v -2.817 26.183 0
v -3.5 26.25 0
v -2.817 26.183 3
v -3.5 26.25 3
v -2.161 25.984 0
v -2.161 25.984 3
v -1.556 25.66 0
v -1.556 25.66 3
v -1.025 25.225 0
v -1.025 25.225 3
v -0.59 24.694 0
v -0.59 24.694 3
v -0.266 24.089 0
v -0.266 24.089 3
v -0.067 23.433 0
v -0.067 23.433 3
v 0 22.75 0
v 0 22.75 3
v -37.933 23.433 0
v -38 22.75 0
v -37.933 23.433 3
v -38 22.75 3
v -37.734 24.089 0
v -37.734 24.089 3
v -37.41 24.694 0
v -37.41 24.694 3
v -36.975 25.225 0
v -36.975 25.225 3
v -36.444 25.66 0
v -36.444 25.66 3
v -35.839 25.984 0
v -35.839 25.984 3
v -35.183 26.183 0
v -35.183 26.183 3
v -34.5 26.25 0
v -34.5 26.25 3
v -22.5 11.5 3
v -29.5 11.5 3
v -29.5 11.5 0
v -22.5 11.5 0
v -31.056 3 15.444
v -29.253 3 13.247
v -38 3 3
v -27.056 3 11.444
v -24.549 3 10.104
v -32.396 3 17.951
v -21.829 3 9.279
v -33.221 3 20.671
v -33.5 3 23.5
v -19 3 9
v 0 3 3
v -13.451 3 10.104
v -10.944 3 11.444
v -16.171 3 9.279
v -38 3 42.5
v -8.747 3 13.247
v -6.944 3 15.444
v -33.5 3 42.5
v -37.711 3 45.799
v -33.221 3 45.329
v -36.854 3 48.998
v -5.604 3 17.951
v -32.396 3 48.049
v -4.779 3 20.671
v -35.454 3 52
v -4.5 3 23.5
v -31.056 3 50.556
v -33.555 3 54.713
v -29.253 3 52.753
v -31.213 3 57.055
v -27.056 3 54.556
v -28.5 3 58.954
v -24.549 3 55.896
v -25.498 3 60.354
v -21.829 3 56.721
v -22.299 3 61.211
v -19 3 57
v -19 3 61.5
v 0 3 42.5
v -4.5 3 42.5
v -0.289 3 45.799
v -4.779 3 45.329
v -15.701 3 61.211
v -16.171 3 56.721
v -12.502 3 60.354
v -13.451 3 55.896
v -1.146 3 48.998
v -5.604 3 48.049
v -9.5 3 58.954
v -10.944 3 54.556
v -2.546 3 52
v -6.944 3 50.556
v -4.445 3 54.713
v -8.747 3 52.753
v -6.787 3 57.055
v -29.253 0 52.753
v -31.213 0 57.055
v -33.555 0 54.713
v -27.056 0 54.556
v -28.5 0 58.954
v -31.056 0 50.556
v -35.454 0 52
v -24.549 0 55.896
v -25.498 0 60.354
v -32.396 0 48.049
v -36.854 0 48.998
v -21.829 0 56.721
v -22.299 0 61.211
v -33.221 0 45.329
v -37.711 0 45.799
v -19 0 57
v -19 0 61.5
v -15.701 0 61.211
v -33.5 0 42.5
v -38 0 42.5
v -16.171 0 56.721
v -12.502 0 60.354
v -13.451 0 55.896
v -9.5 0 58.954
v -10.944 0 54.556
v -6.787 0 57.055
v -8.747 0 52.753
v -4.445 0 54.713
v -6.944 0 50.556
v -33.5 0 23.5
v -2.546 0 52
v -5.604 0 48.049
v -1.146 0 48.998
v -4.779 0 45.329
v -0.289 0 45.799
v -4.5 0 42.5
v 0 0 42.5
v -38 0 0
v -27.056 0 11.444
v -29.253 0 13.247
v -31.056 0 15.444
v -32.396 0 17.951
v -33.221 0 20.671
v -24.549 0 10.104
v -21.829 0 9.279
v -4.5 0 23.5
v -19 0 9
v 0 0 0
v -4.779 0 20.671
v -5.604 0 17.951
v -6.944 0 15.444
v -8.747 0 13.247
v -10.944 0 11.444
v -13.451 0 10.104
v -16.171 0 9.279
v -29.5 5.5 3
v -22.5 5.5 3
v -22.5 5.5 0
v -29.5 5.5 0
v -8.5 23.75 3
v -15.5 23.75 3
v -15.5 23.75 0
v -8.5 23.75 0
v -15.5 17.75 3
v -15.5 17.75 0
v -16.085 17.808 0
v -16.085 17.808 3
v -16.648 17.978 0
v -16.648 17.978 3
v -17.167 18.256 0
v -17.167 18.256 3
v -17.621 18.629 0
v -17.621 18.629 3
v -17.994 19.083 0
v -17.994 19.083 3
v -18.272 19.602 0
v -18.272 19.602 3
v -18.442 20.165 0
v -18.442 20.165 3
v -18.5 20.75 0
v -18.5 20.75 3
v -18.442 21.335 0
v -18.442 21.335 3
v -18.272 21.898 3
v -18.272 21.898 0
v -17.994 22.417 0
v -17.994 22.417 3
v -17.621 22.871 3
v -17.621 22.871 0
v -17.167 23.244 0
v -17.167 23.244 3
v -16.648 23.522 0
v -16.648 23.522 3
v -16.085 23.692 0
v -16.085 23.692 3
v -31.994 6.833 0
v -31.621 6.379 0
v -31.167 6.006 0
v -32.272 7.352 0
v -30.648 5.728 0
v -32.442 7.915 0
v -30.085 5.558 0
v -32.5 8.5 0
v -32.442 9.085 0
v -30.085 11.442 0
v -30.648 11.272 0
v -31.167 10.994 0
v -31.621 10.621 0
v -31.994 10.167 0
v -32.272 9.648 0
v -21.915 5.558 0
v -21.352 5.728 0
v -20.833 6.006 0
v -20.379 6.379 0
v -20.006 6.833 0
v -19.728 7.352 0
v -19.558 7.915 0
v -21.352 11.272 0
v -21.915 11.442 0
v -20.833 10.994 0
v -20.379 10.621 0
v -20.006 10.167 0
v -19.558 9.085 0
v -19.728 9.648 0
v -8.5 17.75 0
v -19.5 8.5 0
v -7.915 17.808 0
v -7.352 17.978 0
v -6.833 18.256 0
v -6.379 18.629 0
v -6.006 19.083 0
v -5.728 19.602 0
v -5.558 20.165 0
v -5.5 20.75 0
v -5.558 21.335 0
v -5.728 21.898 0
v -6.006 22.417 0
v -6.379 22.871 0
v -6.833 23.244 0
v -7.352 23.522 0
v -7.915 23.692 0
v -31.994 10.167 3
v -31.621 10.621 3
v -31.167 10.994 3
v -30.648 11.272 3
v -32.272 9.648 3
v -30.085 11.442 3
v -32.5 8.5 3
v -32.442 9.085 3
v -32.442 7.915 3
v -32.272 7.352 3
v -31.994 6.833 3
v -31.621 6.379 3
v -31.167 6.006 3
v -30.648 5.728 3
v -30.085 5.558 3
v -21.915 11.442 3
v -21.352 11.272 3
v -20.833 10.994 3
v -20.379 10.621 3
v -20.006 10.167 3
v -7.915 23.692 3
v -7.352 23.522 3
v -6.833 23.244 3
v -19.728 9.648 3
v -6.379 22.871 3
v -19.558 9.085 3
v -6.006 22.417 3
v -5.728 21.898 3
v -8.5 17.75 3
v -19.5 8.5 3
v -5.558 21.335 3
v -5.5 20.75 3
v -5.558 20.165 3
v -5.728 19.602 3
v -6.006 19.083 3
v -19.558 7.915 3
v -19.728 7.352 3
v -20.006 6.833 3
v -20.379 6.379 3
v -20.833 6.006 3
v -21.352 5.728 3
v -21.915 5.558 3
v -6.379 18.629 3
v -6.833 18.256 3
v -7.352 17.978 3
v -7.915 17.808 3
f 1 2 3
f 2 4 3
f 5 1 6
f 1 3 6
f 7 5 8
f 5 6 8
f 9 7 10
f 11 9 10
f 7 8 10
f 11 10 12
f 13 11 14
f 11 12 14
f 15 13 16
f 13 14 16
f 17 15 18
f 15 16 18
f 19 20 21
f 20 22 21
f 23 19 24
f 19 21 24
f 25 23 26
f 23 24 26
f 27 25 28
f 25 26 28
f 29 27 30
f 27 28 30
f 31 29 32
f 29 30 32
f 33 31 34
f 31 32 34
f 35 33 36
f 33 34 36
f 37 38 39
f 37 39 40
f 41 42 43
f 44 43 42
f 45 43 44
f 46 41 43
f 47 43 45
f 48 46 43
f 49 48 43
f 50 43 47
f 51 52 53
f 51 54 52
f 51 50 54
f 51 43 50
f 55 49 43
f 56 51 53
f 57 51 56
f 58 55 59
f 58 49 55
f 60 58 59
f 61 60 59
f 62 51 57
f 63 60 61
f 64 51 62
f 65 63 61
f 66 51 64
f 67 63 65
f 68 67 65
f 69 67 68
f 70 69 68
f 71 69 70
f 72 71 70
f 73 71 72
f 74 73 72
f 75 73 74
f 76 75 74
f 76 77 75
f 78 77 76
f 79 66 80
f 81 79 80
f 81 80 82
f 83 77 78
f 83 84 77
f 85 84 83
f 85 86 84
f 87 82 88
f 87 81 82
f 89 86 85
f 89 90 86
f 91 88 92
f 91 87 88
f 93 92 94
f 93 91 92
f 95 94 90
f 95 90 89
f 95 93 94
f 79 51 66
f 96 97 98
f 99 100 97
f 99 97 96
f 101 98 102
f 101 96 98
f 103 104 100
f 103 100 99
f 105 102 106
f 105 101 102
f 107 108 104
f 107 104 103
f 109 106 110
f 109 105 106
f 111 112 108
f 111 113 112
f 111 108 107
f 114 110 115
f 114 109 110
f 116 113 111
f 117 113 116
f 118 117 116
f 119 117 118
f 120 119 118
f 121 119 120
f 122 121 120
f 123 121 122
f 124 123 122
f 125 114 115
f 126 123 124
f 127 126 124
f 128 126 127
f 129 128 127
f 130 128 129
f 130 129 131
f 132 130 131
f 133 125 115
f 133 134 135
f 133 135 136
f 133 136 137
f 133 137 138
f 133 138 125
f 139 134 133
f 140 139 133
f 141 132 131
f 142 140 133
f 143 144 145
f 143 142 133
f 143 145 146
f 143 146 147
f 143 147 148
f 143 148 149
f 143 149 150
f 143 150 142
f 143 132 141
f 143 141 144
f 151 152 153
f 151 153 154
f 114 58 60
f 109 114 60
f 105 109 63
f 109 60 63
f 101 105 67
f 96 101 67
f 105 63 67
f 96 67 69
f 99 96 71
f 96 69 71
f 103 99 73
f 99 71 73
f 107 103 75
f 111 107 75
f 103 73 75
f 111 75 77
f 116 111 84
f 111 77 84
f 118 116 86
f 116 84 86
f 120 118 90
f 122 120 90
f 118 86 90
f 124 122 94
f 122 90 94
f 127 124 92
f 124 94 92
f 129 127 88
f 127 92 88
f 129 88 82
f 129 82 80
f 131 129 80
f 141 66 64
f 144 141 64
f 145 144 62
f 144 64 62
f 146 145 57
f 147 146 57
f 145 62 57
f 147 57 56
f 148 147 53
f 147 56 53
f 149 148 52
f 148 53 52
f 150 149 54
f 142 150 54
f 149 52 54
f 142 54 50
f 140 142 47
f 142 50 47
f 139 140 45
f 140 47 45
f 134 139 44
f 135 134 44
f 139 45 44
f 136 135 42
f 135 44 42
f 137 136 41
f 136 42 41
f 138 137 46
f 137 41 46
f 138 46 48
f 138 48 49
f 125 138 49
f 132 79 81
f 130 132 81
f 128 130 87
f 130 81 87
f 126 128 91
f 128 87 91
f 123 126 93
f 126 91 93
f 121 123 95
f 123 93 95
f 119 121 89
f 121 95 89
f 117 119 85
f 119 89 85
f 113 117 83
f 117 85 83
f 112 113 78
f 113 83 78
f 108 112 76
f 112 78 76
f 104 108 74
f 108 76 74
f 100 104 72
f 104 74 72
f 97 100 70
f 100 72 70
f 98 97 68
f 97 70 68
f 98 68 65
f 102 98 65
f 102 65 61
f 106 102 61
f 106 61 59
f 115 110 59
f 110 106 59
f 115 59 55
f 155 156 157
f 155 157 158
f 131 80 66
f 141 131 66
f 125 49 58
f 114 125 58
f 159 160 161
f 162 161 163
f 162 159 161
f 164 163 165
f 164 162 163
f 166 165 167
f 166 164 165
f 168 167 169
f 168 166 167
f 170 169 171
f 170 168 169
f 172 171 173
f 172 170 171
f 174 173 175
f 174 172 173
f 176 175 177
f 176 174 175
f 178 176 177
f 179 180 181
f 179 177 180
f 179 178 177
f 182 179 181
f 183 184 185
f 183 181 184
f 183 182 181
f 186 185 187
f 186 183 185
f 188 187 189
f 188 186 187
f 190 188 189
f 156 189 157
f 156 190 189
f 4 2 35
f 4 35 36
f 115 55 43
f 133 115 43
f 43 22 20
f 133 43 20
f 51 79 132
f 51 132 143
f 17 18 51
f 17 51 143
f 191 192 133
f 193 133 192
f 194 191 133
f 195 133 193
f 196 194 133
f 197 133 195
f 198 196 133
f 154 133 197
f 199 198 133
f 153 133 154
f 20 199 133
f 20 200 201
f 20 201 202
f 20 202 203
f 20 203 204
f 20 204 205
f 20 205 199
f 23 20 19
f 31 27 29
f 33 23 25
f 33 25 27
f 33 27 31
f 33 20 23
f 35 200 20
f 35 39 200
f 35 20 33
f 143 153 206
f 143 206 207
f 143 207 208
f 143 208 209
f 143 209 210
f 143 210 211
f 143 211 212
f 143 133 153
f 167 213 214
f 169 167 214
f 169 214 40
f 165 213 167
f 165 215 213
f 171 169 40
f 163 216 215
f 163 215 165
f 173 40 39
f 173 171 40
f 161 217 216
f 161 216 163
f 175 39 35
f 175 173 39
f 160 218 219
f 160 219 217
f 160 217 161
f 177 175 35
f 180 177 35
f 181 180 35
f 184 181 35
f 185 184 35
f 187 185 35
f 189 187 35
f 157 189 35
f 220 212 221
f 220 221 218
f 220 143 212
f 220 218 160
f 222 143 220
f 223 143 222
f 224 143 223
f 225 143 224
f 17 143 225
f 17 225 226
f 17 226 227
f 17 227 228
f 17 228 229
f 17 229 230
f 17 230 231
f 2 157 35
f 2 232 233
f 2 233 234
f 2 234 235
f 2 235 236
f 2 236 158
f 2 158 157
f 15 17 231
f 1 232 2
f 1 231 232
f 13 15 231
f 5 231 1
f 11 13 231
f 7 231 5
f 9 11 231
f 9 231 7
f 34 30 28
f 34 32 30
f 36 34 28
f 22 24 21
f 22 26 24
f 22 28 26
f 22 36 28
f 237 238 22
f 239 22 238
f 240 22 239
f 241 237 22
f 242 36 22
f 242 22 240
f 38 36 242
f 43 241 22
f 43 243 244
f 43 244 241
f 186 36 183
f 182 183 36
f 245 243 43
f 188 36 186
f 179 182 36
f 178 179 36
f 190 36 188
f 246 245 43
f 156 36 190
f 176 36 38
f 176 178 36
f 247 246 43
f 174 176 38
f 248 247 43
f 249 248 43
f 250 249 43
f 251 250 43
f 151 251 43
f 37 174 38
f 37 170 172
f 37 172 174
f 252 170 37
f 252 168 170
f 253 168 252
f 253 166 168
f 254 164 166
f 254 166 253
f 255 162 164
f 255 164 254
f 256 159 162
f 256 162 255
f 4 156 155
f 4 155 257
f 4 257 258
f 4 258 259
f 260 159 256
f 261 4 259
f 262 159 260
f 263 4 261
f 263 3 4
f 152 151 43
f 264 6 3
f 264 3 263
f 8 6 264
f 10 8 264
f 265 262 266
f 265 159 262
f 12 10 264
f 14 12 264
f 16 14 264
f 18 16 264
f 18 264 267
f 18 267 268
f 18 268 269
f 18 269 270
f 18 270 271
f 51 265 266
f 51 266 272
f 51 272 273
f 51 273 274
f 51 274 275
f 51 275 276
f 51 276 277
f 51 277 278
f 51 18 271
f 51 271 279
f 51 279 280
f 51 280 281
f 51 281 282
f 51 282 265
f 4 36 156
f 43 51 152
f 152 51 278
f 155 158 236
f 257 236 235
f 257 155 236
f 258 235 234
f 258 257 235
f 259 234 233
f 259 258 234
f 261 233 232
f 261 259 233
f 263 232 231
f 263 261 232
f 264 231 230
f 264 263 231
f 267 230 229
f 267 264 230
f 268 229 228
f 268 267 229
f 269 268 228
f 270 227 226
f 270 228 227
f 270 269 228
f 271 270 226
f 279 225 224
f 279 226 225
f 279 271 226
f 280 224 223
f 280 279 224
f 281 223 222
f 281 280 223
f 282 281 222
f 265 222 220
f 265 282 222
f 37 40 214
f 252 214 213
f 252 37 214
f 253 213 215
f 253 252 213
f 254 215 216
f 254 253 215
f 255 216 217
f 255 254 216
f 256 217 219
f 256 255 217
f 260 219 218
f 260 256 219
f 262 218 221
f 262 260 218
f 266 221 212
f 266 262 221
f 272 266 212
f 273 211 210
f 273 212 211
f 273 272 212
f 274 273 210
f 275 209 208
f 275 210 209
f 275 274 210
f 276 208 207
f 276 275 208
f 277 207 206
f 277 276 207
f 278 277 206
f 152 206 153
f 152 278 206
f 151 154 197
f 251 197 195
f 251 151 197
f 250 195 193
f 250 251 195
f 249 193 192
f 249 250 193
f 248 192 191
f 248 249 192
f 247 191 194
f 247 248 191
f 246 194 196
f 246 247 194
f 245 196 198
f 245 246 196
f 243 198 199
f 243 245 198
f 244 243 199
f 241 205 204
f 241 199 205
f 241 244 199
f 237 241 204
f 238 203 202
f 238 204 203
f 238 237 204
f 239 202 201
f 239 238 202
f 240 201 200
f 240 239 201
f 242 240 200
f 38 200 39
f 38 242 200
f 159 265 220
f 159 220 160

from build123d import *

# Parameters (mm, degrees)
EXTRUDE_THIN1_DEPTH = 38
CUT_EXTRUDE1_DEPTH  = 4
FILLET1_R           = 3.5
FILLET2_R           = 3.5
CUT_EXTRUDE2_DEPTH  = 4


with BuildPart() as part:
    # Sketch2 → Extrude-Thin1 (new body)
    with BuildSketch(Plane(origin=(0, 0, 0), x_dir=(0, 0, -1), z_dir=(1, 0, 0))):
        Polygon((-63, 0), (0, 0), (0, 26.25), (-3, 26.25), (-3, 3), (-63, 3), align=None)
    extrude(amount=-EXTRUDE_THIN1_DEPTH)

    # Sketch3 → Cut-Extrude1 (cut, through all)
    with BuildSketch(Plane.XY.offset(3)):
        with BuildLine():
            Line((-29.5, 11.5), (-22.5, 11.5))
            ThreePointArc((-22.5, 11.5), (-19.5, 8.5), (-22.5, 5.5))
            Line((-22.5, 5.5), (-29.5, 5.5))
            ThreePointArc((-29.5, 5.5), (-32.5, 8.5), (-29.5, 11.5))
        make_face()
        with BuildLine():
            Line((-15.5, 23.75), (-8.5, 23.75))
            ThreePointArc((-8.5, 23.75), (-5.5, 20.75), (-8.5, 17.75))
            Line((-8.5, 17.75), (-15.5, 17.75))
            ThreePointArc((-15.5, 17.75), (-18.5, 20.75), (-15.5, 23.75))
        make_face()
    extrude(amount=-CUT_EXTRUDE1_DEPTH, mode=Mode.SUBTRACT)

    # Fillet1
    fillet1_edges = [part.edges().sort_by_distance(p)[0] for p in [
        (-38, 26.25, 1.5),
    ]]
    fillet(fillet1_edges, radius=FILLET1_R)

    # Fillet2
    fillet2_edges = [part.edges().sort_by_distance(p)[0] for p in [
        (0, 26.25, 1.5),
    ]]
    fillet(fillet2_edges, radius=FILLET2_R)

    # Sketch4 → Cut-Extrude2 (cut, through all)
    with BuildSketch(Plane(origin=(0, 3, 0), x_dir=(1, 0, 0), z_dir=(0, 1, 0))):
        with BuildLine():
            Line((-33.5, -23.5), (-33.5, -42.5))
            ThreePointArc((-33.5, -42.5), (-19, -57), (-4.5, -42.5))
            Line((-4.5, -42.5), (-4.5, -23.5))
            ThreePointArc((-4.5, -23.5), (-19, -9), (-33.5, -23.5))
        make_face()
        with BuildLine():
            Line((0, -63), (0, -42.5))
            ThreePointArc((0, -42.5), (-19, -61.5), (-38, -42.5))
            Line((-38, -42.5), (-38, -63))
            Line((-38, -63), (0, -63))
        make_face()
    extrude(amount=-CUT_EXTRUDE2_DEPTH, mode=Mode.SUBTRACT)


solid = part.part
